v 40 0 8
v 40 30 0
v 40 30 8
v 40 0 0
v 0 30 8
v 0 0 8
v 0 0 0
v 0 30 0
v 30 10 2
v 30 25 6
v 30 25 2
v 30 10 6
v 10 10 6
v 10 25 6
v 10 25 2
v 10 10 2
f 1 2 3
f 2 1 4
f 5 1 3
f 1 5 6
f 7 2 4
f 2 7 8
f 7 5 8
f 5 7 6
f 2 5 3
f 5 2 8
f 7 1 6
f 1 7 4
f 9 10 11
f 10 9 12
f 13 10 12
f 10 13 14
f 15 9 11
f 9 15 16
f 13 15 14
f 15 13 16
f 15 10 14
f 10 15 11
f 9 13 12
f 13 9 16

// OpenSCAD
module rectangular_box(length, width, height) {
  difference() {
    cube([length, width, height]);
    translate([length/4, length/4, height/4]) cube([length/2, width/2, height/2]);
  }
}

rectangular_box(40, 30, 8);
